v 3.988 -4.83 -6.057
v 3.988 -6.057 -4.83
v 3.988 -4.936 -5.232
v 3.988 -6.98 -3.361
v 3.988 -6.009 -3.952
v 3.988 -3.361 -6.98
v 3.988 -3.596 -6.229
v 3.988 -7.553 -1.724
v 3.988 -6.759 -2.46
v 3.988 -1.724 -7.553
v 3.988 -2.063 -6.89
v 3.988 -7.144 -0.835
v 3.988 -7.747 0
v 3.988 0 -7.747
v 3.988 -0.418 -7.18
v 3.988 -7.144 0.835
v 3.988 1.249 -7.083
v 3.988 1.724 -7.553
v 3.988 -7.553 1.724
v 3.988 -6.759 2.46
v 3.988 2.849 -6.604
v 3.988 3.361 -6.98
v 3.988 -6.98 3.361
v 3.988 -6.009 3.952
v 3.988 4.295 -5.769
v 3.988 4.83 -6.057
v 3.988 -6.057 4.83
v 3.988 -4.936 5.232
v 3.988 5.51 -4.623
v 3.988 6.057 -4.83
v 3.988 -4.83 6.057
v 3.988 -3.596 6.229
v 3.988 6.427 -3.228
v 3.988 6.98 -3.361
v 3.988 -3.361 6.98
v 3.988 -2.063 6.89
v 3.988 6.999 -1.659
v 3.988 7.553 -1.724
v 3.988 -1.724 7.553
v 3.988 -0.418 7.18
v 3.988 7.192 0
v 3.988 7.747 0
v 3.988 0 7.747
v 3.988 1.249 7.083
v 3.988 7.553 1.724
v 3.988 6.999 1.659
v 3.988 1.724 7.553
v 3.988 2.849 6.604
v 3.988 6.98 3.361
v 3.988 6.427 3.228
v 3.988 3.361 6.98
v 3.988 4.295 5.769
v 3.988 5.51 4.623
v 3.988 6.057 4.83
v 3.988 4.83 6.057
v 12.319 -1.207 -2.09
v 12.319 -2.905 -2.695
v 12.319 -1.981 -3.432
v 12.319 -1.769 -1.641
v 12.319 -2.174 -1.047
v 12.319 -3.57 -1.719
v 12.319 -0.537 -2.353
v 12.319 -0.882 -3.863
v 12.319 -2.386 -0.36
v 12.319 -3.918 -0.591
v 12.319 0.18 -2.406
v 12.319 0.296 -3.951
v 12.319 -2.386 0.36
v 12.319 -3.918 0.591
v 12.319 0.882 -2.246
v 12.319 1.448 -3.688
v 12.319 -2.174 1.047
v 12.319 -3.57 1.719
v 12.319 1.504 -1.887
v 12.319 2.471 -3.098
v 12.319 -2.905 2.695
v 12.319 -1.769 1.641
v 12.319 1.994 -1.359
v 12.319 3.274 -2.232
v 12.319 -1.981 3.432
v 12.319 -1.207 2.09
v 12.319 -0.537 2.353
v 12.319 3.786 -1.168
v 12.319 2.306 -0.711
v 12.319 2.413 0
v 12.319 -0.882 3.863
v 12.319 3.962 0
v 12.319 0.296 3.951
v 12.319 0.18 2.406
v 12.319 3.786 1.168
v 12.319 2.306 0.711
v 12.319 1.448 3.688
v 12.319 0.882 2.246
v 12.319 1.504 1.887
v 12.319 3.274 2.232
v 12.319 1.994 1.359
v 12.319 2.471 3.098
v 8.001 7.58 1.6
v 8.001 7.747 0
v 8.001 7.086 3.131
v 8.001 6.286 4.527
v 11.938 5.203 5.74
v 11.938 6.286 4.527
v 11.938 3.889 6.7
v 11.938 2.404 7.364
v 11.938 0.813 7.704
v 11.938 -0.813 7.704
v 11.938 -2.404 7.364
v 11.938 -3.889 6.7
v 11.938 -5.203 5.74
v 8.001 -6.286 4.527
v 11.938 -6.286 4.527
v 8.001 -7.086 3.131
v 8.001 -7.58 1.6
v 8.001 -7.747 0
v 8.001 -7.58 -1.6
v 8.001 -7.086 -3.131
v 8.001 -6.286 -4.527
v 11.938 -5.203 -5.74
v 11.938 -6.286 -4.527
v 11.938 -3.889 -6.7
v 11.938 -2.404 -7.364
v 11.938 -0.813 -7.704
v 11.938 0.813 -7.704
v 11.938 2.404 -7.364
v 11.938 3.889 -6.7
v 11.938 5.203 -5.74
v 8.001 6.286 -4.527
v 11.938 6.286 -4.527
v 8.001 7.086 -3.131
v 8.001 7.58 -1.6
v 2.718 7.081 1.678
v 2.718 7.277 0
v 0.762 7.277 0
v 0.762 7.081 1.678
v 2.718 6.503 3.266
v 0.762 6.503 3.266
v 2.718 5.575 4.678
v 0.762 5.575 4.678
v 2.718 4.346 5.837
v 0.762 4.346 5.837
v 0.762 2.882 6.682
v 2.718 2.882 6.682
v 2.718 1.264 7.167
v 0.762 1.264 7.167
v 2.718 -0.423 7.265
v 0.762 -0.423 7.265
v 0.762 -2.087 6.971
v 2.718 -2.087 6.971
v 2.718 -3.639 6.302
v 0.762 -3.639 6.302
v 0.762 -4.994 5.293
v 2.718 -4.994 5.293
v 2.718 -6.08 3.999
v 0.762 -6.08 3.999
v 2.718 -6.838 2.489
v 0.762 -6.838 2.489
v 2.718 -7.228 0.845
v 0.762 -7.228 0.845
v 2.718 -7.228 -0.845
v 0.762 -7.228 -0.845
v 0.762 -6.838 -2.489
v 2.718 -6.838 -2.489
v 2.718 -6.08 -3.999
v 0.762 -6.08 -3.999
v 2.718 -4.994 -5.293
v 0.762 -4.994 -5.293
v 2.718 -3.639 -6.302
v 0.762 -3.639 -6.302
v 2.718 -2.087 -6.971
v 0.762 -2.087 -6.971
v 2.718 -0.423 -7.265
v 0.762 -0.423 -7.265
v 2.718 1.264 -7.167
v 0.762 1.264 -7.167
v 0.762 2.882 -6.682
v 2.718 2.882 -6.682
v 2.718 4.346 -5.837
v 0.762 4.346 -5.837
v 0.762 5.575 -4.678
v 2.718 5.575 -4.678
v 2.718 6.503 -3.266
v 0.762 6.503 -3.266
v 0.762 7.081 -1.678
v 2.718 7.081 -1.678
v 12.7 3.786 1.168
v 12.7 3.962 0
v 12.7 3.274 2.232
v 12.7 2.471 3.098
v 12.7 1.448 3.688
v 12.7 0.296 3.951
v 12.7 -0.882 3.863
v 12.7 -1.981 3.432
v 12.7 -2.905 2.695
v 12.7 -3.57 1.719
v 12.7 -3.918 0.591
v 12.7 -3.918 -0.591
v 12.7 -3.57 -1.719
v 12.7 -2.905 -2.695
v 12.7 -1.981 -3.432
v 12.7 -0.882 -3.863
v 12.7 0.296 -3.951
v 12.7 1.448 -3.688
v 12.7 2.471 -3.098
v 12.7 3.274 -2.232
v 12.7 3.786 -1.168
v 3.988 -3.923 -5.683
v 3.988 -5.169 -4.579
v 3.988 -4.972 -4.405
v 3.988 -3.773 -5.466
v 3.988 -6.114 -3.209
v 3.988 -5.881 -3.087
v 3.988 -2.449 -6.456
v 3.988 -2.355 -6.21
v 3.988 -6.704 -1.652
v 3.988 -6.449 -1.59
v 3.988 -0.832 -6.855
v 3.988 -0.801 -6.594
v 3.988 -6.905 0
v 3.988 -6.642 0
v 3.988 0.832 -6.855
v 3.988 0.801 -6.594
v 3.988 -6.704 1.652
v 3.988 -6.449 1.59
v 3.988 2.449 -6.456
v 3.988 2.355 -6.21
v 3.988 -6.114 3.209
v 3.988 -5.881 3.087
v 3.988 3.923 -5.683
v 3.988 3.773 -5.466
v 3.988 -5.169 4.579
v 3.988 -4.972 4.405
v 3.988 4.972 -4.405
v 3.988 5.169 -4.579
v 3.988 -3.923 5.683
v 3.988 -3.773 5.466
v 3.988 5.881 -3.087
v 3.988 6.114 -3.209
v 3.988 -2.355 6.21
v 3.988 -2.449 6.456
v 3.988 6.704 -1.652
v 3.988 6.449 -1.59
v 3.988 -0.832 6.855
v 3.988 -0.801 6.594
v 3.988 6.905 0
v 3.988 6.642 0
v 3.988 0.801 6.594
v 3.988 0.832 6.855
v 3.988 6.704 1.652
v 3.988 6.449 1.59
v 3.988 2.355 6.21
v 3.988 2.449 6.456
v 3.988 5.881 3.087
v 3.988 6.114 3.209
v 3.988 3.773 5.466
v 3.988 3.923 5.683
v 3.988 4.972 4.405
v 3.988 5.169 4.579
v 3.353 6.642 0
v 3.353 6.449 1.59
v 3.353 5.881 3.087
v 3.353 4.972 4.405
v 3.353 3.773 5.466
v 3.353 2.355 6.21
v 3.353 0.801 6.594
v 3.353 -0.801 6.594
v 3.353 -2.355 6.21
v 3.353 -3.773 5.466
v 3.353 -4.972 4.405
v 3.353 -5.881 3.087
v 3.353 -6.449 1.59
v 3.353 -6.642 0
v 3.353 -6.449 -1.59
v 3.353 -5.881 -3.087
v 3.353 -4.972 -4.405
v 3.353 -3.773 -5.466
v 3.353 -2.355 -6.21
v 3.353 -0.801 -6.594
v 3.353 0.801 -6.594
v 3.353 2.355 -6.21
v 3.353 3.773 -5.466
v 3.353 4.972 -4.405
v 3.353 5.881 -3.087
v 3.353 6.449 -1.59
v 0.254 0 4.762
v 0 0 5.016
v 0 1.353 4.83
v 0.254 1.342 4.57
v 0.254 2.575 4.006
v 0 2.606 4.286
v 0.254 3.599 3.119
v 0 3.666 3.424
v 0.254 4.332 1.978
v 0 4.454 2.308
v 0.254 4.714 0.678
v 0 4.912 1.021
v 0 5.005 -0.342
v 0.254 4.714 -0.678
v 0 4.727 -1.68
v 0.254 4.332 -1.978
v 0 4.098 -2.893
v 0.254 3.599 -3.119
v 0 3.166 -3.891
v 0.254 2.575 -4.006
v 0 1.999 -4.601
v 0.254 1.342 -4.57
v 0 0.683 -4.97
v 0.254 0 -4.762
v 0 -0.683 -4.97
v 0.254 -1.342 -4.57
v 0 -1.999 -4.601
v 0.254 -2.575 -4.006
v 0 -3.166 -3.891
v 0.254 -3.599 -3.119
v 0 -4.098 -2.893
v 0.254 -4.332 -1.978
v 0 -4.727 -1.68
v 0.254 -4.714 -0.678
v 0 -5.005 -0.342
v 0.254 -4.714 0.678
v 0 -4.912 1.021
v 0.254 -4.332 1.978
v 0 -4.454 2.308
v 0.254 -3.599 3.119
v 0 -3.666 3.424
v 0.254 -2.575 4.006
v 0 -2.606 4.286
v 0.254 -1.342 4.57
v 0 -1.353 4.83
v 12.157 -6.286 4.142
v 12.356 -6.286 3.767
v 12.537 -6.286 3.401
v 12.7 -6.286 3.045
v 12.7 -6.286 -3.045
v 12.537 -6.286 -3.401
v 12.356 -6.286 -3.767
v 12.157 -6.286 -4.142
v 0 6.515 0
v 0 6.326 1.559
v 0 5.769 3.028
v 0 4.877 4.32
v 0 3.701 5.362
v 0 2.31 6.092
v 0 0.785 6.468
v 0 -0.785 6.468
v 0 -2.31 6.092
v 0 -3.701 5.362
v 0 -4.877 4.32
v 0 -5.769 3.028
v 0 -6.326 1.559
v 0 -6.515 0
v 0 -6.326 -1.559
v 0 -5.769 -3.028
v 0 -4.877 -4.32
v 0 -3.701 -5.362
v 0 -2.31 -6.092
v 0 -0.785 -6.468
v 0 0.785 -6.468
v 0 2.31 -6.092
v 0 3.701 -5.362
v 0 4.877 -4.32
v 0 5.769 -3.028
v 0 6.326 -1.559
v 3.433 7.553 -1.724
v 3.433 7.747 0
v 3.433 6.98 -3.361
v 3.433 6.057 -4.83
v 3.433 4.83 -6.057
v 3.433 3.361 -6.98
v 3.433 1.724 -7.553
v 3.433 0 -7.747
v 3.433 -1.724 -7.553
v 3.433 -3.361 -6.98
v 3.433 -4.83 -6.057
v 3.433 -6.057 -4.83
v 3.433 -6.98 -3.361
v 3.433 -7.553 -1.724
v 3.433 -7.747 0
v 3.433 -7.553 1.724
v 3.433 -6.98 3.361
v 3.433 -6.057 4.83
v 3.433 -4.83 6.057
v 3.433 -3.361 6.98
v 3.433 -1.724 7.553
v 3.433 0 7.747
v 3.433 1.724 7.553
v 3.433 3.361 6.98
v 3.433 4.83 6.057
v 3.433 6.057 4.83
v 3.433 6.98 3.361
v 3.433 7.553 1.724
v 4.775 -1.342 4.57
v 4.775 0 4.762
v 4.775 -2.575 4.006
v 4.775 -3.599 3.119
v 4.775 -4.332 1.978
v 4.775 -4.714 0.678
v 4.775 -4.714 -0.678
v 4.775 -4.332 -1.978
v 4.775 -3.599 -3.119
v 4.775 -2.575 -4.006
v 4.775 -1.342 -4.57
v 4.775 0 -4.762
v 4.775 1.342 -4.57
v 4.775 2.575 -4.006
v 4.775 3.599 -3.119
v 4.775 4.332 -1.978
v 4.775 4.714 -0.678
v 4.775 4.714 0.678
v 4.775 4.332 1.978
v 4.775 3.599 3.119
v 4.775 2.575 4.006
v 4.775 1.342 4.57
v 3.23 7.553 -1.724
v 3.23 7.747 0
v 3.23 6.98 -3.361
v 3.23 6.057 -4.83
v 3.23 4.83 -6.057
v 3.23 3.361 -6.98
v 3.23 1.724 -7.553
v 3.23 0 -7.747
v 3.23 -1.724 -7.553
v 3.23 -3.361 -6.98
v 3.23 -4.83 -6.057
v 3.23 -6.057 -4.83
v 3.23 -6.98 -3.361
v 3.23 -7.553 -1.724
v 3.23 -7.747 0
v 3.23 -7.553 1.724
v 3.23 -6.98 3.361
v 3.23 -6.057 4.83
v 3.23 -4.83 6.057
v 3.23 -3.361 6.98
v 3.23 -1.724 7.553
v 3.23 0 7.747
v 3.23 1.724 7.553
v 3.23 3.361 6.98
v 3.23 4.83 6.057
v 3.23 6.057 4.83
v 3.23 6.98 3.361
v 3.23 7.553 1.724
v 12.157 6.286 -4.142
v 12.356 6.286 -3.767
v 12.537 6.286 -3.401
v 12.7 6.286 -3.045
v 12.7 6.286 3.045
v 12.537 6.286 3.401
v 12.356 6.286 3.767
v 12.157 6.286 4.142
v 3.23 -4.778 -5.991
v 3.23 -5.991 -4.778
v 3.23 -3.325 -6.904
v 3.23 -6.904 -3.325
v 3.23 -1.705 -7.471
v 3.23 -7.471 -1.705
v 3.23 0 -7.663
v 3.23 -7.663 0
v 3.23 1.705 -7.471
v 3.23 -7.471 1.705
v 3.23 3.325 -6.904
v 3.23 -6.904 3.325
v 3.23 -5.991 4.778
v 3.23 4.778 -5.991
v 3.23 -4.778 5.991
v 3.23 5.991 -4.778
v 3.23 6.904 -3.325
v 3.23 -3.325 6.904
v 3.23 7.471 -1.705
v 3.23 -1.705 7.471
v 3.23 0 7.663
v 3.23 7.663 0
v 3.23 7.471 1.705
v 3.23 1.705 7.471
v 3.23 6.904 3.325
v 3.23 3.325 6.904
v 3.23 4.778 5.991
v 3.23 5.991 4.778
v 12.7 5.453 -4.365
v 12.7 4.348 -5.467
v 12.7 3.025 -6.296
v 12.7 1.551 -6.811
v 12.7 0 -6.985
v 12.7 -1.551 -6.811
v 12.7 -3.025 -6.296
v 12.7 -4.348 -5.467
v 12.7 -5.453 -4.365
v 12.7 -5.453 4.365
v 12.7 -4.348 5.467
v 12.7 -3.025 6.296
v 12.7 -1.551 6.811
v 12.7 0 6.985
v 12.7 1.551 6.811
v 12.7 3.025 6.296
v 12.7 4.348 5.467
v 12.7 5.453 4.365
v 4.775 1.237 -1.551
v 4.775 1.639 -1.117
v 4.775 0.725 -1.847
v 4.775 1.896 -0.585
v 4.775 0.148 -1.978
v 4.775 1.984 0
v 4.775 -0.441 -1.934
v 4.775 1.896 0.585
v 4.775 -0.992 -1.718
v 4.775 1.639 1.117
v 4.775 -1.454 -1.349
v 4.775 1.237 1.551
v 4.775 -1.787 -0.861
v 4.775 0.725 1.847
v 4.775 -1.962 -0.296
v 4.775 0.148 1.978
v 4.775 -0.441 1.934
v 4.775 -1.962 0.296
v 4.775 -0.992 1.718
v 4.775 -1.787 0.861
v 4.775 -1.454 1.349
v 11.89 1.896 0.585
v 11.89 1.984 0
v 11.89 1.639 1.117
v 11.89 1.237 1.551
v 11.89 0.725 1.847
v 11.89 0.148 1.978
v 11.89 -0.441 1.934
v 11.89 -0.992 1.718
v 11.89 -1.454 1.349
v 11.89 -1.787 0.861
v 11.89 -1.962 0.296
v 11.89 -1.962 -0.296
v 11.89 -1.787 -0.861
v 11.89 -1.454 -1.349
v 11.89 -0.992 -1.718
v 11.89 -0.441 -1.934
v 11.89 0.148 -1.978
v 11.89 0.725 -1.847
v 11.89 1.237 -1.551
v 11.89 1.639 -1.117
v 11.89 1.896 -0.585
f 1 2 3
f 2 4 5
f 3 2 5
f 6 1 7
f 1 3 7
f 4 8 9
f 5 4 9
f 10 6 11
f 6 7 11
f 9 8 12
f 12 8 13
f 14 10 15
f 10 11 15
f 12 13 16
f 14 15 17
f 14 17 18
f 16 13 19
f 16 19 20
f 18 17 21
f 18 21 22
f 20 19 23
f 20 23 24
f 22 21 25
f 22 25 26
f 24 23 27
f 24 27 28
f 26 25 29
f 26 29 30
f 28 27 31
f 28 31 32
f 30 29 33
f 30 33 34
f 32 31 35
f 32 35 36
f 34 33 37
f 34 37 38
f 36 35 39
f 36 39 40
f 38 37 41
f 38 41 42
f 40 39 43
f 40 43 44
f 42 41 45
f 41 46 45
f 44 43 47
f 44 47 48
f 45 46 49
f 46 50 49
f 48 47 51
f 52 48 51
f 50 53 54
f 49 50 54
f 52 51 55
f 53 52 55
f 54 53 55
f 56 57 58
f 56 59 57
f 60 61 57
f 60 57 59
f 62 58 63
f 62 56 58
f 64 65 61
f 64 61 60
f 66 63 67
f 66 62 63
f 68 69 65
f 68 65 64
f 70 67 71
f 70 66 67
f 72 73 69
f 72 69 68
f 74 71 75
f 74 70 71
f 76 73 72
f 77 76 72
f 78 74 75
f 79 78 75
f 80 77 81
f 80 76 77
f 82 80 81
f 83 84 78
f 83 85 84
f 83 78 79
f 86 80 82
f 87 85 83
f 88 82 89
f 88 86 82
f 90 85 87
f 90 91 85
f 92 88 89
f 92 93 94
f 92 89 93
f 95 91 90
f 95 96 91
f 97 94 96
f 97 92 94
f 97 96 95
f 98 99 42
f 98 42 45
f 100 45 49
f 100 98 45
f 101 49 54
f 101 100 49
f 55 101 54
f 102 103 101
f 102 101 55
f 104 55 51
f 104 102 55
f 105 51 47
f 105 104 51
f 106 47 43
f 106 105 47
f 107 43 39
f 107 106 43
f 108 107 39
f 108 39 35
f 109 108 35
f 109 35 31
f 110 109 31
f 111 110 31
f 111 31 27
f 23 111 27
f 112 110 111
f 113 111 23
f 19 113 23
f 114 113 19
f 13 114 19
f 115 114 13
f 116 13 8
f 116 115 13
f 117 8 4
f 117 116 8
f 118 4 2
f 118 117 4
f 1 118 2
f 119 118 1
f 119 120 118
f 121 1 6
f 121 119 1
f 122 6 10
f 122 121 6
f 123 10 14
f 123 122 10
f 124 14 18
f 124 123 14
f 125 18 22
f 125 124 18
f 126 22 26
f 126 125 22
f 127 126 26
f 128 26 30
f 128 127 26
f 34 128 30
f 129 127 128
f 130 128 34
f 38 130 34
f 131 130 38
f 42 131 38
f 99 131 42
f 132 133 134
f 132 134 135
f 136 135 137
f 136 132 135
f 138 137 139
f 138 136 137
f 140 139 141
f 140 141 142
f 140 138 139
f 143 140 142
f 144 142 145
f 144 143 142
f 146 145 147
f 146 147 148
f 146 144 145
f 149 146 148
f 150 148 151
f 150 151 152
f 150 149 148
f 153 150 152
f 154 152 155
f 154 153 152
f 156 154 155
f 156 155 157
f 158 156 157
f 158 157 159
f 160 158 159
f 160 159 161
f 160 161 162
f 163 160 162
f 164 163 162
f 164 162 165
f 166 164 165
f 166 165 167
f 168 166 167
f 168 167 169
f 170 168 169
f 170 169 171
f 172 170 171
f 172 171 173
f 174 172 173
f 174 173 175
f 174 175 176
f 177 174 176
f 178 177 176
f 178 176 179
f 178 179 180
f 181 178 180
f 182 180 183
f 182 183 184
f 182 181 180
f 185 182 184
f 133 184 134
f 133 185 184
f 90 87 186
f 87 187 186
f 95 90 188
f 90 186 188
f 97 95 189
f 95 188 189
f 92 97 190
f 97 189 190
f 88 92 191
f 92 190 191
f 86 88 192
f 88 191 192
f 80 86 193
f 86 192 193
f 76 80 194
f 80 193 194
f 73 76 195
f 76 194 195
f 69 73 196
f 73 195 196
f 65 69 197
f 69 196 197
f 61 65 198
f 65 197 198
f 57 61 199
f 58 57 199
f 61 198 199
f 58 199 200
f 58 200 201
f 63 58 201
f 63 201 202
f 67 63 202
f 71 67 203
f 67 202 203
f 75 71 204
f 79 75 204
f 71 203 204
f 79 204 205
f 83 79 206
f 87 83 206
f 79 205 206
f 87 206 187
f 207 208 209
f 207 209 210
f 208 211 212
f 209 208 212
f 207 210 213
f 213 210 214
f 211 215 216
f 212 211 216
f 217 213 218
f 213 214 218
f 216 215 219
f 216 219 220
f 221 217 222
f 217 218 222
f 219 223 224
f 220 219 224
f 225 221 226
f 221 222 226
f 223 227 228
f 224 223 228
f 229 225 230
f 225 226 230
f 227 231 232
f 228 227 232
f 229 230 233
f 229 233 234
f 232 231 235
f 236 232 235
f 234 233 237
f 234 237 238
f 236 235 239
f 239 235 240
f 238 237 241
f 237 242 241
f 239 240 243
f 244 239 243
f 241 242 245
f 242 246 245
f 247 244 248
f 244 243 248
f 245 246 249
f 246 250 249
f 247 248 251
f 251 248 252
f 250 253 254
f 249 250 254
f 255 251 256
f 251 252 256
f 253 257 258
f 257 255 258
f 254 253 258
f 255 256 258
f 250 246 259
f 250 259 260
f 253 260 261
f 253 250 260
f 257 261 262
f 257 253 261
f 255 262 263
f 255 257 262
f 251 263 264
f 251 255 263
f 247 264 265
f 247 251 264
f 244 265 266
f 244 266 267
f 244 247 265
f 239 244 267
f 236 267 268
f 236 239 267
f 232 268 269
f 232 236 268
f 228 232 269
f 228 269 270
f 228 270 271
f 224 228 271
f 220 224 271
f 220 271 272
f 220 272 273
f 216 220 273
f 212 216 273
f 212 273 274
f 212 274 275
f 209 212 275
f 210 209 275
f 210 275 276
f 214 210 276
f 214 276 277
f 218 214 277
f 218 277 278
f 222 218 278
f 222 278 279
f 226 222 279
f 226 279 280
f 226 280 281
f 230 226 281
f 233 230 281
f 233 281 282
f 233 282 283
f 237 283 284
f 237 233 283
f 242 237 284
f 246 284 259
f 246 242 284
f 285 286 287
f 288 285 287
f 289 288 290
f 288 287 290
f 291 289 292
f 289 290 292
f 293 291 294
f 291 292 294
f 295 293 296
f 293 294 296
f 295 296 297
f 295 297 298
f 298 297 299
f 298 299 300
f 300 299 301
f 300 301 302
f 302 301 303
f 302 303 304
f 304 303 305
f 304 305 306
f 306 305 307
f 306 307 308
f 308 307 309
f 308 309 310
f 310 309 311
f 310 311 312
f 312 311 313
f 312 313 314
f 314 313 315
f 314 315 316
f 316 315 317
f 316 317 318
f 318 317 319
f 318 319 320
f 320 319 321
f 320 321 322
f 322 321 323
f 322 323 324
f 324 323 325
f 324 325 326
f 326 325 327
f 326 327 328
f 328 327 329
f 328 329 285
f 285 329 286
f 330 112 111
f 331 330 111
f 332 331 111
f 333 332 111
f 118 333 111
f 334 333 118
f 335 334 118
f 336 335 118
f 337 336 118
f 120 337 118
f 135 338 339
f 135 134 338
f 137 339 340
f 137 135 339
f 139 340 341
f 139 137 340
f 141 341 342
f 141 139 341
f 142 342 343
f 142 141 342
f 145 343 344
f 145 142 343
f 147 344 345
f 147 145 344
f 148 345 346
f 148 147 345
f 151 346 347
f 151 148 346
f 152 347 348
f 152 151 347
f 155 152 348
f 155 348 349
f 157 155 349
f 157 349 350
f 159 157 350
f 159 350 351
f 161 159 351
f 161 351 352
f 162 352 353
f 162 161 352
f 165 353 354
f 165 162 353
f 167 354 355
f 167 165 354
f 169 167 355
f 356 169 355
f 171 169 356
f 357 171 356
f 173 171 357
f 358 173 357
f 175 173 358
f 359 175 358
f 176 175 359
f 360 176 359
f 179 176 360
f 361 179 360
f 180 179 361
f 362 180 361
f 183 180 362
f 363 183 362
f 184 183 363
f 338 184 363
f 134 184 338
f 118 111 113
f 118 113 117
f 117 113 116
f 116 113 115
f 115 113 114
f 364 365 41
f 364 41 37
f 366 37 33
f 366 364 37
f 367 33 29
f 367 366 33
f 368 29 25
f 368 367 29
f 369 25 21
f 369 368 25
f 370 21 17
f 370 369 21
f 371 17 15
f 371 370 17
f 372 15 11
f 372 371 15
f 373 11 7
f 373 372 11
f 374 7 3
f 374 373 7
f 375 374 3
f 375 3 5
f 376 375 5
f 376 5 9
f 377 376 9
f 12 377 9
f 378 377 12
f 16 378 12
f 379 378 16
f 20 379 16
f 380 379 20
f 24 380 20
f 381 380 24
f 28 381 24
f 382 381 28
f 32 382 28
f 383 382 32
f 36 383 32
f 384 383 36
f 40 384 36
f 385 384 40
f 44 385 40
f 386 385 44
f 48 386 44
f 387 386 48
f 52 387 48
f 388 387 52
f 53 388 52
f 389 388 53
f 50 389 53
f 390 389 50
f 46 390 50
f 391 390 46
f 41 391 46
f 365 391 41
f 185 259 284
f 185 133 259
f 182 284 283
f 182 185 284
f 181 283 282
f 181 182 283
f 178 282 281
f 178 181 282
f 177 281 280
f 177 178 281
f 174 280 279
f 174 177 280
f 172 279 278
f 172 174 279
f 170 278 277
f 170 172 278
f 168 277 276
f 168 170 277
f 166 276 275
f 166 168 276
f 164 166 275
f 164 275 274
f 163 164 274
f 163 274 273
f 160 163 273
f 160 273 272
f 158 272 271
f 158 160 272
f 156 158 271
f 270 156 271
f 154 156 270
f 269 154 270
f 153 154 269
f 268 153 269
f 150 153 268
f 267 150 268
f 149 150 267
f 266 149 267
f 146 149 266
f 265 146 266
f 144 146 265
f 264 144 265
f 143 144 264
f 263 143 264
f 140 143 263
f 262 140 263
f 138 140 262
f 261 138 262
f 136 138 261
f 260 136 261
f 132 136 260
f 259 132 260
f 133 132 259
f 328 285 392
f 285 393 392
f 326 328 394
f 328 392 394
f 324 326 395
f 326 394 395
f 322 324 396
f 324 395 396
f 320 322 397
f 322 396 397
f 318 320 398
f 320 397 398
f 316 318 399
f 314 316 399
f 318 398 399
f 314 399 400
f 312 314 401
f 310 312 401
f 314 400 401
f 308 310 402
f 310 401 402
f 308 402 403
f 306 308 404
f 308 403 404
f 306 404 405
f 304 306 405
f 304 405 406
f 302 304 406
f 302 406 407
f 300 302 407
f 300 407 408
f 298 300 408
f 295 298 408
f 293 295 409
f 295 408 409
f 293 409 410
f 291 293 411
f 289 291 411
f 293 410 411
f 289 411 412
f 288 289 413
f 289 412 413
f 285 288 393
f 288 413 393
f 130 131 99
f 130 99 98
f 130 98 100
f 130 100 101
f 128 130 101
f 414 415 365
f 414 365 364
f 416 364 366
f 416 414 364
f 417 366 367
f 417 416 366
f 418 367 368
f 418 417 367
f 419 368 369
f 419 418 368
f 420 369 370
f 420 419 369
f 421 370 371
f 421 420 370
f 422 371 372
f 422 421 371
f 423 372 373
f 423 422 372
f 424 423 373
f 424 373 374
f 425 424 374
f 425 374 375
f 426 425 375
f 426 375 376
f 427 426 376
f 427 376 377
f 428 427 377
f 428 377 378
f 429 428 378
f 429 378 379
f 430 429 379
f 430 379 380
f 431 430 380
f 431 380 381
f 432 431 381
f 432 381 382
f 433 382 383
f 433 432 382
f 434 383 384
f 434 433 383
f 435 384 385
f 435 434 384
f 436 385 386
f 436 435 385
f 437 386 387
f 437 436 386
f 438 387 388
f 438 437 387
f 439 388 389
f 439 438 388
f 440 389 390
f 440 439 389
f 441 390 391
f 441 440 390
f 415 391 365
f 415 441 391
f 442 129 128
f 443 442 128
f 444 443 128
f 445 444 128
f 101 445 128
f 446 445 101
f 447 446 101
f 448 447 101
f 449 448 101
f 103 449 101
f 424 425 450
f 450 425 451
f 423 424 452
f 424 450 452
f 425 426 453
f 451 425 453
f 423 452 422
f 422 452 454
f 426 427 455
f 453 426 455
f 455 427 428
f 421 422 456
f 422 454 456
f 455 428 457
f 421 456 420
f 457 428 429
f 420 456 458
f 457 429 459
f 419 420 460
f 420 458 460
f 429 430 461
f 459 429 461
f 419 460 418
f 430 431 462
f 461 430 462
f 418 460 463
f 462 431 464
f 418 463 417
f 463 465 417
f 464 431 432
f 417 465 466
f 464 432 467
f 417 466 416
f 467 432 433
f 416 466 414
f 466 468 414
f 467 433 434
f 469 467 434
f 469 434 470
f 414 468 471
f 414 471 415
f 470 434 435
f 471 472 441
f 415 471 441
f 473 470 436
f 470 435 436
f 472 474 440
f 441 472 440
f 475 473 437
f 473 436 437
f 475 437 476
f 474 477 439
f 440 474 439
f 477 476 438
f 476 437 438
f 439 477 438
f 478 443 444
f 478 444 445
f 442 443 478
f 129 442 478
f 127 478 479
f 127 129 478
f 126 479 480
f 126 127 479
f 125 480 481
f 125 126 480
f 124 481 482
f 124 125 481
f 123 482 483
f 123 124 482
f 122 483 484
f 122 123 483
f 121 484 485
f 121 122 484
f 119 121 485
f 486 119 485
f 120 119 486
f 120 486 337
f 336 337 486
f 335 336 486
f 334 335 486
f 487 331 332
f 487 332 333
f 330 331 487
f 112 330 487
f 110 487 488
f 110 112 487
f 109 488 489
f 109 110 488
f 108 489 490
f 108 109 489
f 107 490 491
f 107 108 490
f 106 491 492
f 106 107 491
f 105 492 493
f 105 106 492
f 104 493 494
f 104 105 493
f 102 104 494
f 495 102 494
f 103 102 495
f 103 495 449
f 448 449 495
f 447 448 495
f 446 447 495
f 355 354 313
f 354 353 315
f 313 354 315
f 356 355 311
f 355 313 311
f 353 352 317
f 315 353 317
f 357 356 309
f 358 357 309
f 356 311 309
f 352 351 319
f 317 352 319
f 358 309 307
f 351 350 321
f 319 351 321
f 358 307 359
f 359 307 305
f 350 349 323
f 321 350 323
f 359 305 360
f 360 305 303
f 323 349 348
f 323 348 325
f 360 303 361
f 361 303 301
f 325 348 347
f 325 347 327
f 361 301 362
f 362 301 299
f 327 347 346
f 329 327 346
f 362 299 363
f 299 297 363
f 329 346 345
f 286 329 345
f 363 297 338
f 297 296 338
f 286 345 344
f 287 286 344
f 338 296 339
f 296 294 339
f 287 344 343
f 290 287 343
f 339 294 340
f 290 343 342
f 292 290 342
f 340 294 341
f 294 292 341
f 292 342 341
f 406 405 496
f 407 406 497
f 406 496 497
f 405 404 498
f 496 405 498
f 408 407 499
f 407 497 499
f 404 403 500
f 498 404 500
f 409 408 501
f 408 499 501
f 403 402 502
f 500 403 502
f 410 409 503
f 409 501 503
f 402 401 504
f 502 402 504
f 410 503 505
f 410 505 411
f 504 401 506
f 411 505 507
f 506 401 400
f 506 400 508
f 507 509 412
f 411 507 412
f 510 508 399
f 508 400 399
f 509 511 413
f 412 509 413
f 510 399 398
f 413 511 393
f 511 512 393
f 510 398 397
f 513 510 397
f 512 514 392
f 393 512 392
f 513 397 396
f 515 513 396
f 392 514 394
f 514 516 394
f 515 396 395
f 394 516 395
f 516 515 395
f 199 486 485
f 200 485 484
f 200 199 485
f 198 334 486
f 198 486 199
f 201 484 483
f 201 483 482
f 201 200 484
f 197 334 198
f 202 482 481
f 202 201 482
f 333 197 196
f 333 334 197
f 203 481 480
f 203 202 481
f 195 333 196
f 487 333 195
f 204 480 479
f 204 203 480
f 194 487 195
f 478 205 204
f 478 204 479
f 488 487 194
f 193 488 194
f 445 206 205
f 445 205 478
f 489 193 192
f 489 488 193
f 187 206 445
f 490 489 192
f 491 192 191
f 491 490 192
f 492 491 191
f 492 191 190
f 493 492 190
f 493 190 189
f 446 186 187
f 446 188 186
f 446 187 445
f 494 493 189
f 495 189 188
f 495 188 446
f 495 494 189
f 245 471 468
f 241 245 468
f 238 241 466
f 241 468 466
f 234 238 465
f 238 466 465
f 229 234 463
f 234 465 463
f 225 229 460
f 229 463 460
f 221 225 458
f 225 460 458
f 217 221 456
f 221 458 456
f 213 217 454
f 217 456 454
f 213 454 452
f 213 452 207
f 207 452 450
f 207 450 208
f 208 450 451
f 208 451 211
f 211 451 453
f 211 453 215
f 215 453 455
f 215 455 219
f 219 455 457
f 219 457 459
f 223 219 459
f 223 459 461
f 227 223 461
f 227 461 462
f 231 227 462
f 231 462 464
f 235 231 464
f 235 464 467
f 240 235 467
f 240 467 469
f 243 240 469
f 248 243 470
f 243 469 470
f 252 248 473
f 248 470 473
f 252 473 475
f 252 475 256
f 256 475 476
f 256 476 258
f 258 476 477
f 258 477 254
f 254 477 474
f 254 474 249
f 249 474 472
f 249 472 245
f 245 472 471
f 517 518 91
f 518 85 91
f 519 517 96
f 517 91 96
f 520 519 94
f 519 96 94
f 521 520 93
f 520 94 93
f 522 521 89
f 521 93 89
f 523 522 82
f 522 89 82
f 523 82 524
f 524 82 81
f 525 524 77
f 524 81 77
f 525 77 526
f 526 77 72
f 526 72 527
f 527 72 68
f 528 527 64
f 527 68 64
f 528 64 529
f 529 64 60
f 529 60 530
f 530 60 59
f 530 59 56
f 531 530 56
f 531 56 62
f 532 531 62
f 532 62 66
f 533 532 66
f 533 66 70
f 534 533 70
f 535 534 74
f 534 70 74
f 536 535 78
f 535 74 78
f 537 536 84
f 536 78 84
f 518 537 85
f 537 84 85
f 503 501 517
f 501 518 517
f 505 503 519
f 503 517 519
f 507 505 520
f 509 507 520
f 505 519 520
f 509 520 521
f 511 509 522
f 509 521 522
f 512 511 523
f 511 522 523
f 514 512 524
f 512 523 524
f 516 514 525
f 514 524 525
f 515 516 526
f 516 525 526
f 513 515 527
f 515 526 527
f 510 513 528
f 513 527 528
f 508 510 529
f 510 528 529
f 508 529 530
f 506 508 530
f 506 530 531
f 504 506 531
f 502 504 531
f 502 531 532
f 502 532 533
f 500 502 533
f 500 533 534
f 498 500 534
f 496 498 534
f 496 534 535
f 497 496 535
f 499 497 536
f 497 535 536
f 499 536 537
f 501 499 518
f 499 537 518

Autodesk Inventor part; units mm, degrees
sketch "Sketch_1" plane through (0, 0, 0) normal (0, 0, 1) x (1, 0, 0)
  line L0 (12.7, 0) -> (0, 0)
  line L1 (0, 0) -> (0, 6.5151)
  line L2 (0, 6.5151) -> (0.762, 7.2771)
  line L3 (0.762, 7.2771) -> (2.7178, 7.2771)
  line L4 (2.7178, 7.2771) -> (3.3528, 6.6421)
  line L5 (3.3528, 6.6421) -> (3.9878, 6.6421)
  line L6 (3.9878, 6.6421) -> (3.9878, 7.747)
  line L7 (3.9878, 7.747) -> (11.938, 7.747)
  line L8 (11.938, 7.747) -> (12.7, 6.985)
  line L9 (12.7, 6.985) -> (12.7, 0)
  line L10 (12.7, 0) -> (0, 0)
revolve "Revolution1" add sketch "Sketch_1" angle 360 about axis through (12.7, 0, 0) along (1, 0, 0)
sketch "Sketch_2" plane through (12.7, 0, 0) normal (1, 0, 0) x (0, 0, -1)
  line L0 (-30.988, 12.573) -> (-30.988, -12.573)
  line L1 (-30.988, -12.573) -> (30.988, -12.573)
  line L2 (30.988, -12.573) -> (30.988, 12.573)
  line L3 (30.988, 12.573) -> (-30.988, 12.573)
  line L4 (-15.494, 6.2865) -> (-15.494, -6.2865)
  line L5 (-15.494, -6.2865) -> (15.494, -6.2865)
  line L6 (15.494, -6.2865) -> (15.494, 6.2865)
  line L7 (15.494, 6.2865) -> (-15.494, 6.2865)
extrude "Extrusion1" cut sketch "Sketch_2" against normal blind 4.699
sketch "Sketch3" plane through (0, 0, 0) normal (-1, 0, 0) x (0, 0, 1)
  point P0 (0, 0)
hole "Hole1" at (0, 0, 0) direction (1, 0, 0) diameter 9.525 depth 4.7752 countersink diameter 10.033 countersink angle 90
sketch "Sketch_5" plane through (0, 0, 0) normal (0, 0, 1) x (1, 0, 0)
  line L0 (12.7, 0) -> (-0.381, 0)
  line L1 (-0.381, 0) -> (-0.381, 1.9837)
  line L2 (-0.381, 1.9837) -> (11.8897, 1.9837)
  line L3 (11.8897, 1.9837) -> (12.319, 2.413)
  line L4 (12.319, 2.413) -> (12.319, 3.9624)
  line L5 (12.319, 3.9624) -> (12.7, 3.9624)
  line L6 (12.7, 3.9624) -> (12.7, 0)
  line L7 (12.7, 0) -> (-0.381, 0)
revolve "Revolution2" cut sketch "Sketch_5" angle 360 about axis through (12.7, 0, 0) along (1, 0, 0)
thread "Thread1" size "10-32 UNF" class "2B" standard "ANSI Unified Screw Threads" length 4.699 offset 2.8448
sketch "Sketch_9" plane through (0, 0, 0) normal (0, 0, 1) x (1, 0, 0)
  line L0 (12.7, 0) -> (-12.7, 0)
  line L1 (3.2301, 7.6628) -> (4.2508, 6.6421)
  line L2 (4.2508, 6.6421) -> (4.5382, 6.6421)
  line L3 (4.5382, 6.6421) -> (3.4333, 7.747)
  line L4 (3.4333, 7.747) -> (3.2301, 7.747)
  line L5 (3.2301, 7.747) -> (3.2301, 7.6628)
revolve "Revolution3" add sketch "Sketch_9" angle 360 about axis through (12.7, 0, 0) along (1, 0, 0)
ref_plane "aa2_XY" through (12.7, 0, 0) normal (0, 1, 0) x (1, 0, 0)
ref_plane "aa2_YZ" through (12.7, 0, 0) normal (1, 0, 0) x (0, 0, -1)
ref_plane "aa2_ZX" through (12.7, 0, 0) normal (0, 0, -1) x (0, 1, 0)
ref_plane "m1_XY" through (12.7, 0, 0) normal (0, 1, 0) x (1, 0, 0)
ref_plane "m1_YZ" through (12.7, 0, 0) normal (1, 0, 0) x (0, 0, -1)
ref_plane "m1_ZX" through (12.7, 0, 0) normal (0, 0, -1) x (0, 1, 0)
ref_plane "m2_XY" through (8.001, 0, 0) normal (0, 1, 0) x (1, 0, 0)
ref_plane "m2_YZ" through (8.001, 0, 0) normal (1, 0, 0) x (0, 0, -1)
ref_plane "m2_ZX" through (8.001, 0, 0) normal (0, 0, -1) x (0, 1, 0)
ref_plane "n1_XY" through (12.7, 6.2865, 0) normal (1, 0, 0) x (0, 0, -1)
ref_plane "n1_YZ" through (12.7, 6.2865, 0) normal (0, 0, -1) x (0, 1, 0)
ref_plane "n1_ZX" through (12.7, 6.2865, 0) normal (0, 1, 0) x (1, 0, 0)
ref_plane "n2_XY" through (12.7, -6.2865, 0) normal (1, 0, 0) x (0, 0, -1)
ref_plane "n2_YZ" through (12.7, -6.2865, 0) normal (0, 0, -1) x (0, 1, 0)
ref_plane "n2_ZX" through (12.7, -6.2865, 0) normal (0, 1, 0) x (1, 0, 0)
ref_plane "rear_head_XY" through (2.7178, 0, 0) normal (1, 0, 0) x (0, 0, -1)
ref_plane "rear_head_YZ" through (2.7178, 0, 0) normal (0, 0, -1) x (0, 1, 0)
ref_plane "rear_head_ZX" through (2.7178, 0, 0) normal (0, 1, 0) x (1, 0, 0)
ref_plane "to_bushing_XY" through (0, 0, 0) normal (0, 0, 1) x (1, 0, 0)
ref_plane "to_bushing_YZ" through (0, 0, 0) normal (1, 0, 0) x (0, 1, 0)
ref_plane "to_bushing_ZX" through (0, 0, 0) normal (0, 1, 0) x (0, 0, 1)
ref_plane "to_mounting_bracket_xp_XY" through (12.7, 0, 0) normal (1, 0, 0) x (0, 0, -1)
ref_plane "to_mounting_bracket_xp_YZ" through (12.7, 0, 0) normal (0, 0, -1) x (0, 1, 0)
ref_plane "to_mounting_bracket_xp_ZX" through (12.7, 0, 0) normal (0, 1, 0) x (1, 0, 0)
ref_plane "to_pivot_bracket_XY" through (0, 0, 0) normal (0, 0, 1) x (1, 0, 0)
ref_plane "to_pivot_bracket_YZ" through (0, 0, 0) normal (1, 0, 0) x (0, 1, 0)
ref_plane "to_pivot_bracket_ZX" through (0, 0, 0) normal (0, 1, 0) x (0, 0, 1)
properties part number "D-14216rear_head"
